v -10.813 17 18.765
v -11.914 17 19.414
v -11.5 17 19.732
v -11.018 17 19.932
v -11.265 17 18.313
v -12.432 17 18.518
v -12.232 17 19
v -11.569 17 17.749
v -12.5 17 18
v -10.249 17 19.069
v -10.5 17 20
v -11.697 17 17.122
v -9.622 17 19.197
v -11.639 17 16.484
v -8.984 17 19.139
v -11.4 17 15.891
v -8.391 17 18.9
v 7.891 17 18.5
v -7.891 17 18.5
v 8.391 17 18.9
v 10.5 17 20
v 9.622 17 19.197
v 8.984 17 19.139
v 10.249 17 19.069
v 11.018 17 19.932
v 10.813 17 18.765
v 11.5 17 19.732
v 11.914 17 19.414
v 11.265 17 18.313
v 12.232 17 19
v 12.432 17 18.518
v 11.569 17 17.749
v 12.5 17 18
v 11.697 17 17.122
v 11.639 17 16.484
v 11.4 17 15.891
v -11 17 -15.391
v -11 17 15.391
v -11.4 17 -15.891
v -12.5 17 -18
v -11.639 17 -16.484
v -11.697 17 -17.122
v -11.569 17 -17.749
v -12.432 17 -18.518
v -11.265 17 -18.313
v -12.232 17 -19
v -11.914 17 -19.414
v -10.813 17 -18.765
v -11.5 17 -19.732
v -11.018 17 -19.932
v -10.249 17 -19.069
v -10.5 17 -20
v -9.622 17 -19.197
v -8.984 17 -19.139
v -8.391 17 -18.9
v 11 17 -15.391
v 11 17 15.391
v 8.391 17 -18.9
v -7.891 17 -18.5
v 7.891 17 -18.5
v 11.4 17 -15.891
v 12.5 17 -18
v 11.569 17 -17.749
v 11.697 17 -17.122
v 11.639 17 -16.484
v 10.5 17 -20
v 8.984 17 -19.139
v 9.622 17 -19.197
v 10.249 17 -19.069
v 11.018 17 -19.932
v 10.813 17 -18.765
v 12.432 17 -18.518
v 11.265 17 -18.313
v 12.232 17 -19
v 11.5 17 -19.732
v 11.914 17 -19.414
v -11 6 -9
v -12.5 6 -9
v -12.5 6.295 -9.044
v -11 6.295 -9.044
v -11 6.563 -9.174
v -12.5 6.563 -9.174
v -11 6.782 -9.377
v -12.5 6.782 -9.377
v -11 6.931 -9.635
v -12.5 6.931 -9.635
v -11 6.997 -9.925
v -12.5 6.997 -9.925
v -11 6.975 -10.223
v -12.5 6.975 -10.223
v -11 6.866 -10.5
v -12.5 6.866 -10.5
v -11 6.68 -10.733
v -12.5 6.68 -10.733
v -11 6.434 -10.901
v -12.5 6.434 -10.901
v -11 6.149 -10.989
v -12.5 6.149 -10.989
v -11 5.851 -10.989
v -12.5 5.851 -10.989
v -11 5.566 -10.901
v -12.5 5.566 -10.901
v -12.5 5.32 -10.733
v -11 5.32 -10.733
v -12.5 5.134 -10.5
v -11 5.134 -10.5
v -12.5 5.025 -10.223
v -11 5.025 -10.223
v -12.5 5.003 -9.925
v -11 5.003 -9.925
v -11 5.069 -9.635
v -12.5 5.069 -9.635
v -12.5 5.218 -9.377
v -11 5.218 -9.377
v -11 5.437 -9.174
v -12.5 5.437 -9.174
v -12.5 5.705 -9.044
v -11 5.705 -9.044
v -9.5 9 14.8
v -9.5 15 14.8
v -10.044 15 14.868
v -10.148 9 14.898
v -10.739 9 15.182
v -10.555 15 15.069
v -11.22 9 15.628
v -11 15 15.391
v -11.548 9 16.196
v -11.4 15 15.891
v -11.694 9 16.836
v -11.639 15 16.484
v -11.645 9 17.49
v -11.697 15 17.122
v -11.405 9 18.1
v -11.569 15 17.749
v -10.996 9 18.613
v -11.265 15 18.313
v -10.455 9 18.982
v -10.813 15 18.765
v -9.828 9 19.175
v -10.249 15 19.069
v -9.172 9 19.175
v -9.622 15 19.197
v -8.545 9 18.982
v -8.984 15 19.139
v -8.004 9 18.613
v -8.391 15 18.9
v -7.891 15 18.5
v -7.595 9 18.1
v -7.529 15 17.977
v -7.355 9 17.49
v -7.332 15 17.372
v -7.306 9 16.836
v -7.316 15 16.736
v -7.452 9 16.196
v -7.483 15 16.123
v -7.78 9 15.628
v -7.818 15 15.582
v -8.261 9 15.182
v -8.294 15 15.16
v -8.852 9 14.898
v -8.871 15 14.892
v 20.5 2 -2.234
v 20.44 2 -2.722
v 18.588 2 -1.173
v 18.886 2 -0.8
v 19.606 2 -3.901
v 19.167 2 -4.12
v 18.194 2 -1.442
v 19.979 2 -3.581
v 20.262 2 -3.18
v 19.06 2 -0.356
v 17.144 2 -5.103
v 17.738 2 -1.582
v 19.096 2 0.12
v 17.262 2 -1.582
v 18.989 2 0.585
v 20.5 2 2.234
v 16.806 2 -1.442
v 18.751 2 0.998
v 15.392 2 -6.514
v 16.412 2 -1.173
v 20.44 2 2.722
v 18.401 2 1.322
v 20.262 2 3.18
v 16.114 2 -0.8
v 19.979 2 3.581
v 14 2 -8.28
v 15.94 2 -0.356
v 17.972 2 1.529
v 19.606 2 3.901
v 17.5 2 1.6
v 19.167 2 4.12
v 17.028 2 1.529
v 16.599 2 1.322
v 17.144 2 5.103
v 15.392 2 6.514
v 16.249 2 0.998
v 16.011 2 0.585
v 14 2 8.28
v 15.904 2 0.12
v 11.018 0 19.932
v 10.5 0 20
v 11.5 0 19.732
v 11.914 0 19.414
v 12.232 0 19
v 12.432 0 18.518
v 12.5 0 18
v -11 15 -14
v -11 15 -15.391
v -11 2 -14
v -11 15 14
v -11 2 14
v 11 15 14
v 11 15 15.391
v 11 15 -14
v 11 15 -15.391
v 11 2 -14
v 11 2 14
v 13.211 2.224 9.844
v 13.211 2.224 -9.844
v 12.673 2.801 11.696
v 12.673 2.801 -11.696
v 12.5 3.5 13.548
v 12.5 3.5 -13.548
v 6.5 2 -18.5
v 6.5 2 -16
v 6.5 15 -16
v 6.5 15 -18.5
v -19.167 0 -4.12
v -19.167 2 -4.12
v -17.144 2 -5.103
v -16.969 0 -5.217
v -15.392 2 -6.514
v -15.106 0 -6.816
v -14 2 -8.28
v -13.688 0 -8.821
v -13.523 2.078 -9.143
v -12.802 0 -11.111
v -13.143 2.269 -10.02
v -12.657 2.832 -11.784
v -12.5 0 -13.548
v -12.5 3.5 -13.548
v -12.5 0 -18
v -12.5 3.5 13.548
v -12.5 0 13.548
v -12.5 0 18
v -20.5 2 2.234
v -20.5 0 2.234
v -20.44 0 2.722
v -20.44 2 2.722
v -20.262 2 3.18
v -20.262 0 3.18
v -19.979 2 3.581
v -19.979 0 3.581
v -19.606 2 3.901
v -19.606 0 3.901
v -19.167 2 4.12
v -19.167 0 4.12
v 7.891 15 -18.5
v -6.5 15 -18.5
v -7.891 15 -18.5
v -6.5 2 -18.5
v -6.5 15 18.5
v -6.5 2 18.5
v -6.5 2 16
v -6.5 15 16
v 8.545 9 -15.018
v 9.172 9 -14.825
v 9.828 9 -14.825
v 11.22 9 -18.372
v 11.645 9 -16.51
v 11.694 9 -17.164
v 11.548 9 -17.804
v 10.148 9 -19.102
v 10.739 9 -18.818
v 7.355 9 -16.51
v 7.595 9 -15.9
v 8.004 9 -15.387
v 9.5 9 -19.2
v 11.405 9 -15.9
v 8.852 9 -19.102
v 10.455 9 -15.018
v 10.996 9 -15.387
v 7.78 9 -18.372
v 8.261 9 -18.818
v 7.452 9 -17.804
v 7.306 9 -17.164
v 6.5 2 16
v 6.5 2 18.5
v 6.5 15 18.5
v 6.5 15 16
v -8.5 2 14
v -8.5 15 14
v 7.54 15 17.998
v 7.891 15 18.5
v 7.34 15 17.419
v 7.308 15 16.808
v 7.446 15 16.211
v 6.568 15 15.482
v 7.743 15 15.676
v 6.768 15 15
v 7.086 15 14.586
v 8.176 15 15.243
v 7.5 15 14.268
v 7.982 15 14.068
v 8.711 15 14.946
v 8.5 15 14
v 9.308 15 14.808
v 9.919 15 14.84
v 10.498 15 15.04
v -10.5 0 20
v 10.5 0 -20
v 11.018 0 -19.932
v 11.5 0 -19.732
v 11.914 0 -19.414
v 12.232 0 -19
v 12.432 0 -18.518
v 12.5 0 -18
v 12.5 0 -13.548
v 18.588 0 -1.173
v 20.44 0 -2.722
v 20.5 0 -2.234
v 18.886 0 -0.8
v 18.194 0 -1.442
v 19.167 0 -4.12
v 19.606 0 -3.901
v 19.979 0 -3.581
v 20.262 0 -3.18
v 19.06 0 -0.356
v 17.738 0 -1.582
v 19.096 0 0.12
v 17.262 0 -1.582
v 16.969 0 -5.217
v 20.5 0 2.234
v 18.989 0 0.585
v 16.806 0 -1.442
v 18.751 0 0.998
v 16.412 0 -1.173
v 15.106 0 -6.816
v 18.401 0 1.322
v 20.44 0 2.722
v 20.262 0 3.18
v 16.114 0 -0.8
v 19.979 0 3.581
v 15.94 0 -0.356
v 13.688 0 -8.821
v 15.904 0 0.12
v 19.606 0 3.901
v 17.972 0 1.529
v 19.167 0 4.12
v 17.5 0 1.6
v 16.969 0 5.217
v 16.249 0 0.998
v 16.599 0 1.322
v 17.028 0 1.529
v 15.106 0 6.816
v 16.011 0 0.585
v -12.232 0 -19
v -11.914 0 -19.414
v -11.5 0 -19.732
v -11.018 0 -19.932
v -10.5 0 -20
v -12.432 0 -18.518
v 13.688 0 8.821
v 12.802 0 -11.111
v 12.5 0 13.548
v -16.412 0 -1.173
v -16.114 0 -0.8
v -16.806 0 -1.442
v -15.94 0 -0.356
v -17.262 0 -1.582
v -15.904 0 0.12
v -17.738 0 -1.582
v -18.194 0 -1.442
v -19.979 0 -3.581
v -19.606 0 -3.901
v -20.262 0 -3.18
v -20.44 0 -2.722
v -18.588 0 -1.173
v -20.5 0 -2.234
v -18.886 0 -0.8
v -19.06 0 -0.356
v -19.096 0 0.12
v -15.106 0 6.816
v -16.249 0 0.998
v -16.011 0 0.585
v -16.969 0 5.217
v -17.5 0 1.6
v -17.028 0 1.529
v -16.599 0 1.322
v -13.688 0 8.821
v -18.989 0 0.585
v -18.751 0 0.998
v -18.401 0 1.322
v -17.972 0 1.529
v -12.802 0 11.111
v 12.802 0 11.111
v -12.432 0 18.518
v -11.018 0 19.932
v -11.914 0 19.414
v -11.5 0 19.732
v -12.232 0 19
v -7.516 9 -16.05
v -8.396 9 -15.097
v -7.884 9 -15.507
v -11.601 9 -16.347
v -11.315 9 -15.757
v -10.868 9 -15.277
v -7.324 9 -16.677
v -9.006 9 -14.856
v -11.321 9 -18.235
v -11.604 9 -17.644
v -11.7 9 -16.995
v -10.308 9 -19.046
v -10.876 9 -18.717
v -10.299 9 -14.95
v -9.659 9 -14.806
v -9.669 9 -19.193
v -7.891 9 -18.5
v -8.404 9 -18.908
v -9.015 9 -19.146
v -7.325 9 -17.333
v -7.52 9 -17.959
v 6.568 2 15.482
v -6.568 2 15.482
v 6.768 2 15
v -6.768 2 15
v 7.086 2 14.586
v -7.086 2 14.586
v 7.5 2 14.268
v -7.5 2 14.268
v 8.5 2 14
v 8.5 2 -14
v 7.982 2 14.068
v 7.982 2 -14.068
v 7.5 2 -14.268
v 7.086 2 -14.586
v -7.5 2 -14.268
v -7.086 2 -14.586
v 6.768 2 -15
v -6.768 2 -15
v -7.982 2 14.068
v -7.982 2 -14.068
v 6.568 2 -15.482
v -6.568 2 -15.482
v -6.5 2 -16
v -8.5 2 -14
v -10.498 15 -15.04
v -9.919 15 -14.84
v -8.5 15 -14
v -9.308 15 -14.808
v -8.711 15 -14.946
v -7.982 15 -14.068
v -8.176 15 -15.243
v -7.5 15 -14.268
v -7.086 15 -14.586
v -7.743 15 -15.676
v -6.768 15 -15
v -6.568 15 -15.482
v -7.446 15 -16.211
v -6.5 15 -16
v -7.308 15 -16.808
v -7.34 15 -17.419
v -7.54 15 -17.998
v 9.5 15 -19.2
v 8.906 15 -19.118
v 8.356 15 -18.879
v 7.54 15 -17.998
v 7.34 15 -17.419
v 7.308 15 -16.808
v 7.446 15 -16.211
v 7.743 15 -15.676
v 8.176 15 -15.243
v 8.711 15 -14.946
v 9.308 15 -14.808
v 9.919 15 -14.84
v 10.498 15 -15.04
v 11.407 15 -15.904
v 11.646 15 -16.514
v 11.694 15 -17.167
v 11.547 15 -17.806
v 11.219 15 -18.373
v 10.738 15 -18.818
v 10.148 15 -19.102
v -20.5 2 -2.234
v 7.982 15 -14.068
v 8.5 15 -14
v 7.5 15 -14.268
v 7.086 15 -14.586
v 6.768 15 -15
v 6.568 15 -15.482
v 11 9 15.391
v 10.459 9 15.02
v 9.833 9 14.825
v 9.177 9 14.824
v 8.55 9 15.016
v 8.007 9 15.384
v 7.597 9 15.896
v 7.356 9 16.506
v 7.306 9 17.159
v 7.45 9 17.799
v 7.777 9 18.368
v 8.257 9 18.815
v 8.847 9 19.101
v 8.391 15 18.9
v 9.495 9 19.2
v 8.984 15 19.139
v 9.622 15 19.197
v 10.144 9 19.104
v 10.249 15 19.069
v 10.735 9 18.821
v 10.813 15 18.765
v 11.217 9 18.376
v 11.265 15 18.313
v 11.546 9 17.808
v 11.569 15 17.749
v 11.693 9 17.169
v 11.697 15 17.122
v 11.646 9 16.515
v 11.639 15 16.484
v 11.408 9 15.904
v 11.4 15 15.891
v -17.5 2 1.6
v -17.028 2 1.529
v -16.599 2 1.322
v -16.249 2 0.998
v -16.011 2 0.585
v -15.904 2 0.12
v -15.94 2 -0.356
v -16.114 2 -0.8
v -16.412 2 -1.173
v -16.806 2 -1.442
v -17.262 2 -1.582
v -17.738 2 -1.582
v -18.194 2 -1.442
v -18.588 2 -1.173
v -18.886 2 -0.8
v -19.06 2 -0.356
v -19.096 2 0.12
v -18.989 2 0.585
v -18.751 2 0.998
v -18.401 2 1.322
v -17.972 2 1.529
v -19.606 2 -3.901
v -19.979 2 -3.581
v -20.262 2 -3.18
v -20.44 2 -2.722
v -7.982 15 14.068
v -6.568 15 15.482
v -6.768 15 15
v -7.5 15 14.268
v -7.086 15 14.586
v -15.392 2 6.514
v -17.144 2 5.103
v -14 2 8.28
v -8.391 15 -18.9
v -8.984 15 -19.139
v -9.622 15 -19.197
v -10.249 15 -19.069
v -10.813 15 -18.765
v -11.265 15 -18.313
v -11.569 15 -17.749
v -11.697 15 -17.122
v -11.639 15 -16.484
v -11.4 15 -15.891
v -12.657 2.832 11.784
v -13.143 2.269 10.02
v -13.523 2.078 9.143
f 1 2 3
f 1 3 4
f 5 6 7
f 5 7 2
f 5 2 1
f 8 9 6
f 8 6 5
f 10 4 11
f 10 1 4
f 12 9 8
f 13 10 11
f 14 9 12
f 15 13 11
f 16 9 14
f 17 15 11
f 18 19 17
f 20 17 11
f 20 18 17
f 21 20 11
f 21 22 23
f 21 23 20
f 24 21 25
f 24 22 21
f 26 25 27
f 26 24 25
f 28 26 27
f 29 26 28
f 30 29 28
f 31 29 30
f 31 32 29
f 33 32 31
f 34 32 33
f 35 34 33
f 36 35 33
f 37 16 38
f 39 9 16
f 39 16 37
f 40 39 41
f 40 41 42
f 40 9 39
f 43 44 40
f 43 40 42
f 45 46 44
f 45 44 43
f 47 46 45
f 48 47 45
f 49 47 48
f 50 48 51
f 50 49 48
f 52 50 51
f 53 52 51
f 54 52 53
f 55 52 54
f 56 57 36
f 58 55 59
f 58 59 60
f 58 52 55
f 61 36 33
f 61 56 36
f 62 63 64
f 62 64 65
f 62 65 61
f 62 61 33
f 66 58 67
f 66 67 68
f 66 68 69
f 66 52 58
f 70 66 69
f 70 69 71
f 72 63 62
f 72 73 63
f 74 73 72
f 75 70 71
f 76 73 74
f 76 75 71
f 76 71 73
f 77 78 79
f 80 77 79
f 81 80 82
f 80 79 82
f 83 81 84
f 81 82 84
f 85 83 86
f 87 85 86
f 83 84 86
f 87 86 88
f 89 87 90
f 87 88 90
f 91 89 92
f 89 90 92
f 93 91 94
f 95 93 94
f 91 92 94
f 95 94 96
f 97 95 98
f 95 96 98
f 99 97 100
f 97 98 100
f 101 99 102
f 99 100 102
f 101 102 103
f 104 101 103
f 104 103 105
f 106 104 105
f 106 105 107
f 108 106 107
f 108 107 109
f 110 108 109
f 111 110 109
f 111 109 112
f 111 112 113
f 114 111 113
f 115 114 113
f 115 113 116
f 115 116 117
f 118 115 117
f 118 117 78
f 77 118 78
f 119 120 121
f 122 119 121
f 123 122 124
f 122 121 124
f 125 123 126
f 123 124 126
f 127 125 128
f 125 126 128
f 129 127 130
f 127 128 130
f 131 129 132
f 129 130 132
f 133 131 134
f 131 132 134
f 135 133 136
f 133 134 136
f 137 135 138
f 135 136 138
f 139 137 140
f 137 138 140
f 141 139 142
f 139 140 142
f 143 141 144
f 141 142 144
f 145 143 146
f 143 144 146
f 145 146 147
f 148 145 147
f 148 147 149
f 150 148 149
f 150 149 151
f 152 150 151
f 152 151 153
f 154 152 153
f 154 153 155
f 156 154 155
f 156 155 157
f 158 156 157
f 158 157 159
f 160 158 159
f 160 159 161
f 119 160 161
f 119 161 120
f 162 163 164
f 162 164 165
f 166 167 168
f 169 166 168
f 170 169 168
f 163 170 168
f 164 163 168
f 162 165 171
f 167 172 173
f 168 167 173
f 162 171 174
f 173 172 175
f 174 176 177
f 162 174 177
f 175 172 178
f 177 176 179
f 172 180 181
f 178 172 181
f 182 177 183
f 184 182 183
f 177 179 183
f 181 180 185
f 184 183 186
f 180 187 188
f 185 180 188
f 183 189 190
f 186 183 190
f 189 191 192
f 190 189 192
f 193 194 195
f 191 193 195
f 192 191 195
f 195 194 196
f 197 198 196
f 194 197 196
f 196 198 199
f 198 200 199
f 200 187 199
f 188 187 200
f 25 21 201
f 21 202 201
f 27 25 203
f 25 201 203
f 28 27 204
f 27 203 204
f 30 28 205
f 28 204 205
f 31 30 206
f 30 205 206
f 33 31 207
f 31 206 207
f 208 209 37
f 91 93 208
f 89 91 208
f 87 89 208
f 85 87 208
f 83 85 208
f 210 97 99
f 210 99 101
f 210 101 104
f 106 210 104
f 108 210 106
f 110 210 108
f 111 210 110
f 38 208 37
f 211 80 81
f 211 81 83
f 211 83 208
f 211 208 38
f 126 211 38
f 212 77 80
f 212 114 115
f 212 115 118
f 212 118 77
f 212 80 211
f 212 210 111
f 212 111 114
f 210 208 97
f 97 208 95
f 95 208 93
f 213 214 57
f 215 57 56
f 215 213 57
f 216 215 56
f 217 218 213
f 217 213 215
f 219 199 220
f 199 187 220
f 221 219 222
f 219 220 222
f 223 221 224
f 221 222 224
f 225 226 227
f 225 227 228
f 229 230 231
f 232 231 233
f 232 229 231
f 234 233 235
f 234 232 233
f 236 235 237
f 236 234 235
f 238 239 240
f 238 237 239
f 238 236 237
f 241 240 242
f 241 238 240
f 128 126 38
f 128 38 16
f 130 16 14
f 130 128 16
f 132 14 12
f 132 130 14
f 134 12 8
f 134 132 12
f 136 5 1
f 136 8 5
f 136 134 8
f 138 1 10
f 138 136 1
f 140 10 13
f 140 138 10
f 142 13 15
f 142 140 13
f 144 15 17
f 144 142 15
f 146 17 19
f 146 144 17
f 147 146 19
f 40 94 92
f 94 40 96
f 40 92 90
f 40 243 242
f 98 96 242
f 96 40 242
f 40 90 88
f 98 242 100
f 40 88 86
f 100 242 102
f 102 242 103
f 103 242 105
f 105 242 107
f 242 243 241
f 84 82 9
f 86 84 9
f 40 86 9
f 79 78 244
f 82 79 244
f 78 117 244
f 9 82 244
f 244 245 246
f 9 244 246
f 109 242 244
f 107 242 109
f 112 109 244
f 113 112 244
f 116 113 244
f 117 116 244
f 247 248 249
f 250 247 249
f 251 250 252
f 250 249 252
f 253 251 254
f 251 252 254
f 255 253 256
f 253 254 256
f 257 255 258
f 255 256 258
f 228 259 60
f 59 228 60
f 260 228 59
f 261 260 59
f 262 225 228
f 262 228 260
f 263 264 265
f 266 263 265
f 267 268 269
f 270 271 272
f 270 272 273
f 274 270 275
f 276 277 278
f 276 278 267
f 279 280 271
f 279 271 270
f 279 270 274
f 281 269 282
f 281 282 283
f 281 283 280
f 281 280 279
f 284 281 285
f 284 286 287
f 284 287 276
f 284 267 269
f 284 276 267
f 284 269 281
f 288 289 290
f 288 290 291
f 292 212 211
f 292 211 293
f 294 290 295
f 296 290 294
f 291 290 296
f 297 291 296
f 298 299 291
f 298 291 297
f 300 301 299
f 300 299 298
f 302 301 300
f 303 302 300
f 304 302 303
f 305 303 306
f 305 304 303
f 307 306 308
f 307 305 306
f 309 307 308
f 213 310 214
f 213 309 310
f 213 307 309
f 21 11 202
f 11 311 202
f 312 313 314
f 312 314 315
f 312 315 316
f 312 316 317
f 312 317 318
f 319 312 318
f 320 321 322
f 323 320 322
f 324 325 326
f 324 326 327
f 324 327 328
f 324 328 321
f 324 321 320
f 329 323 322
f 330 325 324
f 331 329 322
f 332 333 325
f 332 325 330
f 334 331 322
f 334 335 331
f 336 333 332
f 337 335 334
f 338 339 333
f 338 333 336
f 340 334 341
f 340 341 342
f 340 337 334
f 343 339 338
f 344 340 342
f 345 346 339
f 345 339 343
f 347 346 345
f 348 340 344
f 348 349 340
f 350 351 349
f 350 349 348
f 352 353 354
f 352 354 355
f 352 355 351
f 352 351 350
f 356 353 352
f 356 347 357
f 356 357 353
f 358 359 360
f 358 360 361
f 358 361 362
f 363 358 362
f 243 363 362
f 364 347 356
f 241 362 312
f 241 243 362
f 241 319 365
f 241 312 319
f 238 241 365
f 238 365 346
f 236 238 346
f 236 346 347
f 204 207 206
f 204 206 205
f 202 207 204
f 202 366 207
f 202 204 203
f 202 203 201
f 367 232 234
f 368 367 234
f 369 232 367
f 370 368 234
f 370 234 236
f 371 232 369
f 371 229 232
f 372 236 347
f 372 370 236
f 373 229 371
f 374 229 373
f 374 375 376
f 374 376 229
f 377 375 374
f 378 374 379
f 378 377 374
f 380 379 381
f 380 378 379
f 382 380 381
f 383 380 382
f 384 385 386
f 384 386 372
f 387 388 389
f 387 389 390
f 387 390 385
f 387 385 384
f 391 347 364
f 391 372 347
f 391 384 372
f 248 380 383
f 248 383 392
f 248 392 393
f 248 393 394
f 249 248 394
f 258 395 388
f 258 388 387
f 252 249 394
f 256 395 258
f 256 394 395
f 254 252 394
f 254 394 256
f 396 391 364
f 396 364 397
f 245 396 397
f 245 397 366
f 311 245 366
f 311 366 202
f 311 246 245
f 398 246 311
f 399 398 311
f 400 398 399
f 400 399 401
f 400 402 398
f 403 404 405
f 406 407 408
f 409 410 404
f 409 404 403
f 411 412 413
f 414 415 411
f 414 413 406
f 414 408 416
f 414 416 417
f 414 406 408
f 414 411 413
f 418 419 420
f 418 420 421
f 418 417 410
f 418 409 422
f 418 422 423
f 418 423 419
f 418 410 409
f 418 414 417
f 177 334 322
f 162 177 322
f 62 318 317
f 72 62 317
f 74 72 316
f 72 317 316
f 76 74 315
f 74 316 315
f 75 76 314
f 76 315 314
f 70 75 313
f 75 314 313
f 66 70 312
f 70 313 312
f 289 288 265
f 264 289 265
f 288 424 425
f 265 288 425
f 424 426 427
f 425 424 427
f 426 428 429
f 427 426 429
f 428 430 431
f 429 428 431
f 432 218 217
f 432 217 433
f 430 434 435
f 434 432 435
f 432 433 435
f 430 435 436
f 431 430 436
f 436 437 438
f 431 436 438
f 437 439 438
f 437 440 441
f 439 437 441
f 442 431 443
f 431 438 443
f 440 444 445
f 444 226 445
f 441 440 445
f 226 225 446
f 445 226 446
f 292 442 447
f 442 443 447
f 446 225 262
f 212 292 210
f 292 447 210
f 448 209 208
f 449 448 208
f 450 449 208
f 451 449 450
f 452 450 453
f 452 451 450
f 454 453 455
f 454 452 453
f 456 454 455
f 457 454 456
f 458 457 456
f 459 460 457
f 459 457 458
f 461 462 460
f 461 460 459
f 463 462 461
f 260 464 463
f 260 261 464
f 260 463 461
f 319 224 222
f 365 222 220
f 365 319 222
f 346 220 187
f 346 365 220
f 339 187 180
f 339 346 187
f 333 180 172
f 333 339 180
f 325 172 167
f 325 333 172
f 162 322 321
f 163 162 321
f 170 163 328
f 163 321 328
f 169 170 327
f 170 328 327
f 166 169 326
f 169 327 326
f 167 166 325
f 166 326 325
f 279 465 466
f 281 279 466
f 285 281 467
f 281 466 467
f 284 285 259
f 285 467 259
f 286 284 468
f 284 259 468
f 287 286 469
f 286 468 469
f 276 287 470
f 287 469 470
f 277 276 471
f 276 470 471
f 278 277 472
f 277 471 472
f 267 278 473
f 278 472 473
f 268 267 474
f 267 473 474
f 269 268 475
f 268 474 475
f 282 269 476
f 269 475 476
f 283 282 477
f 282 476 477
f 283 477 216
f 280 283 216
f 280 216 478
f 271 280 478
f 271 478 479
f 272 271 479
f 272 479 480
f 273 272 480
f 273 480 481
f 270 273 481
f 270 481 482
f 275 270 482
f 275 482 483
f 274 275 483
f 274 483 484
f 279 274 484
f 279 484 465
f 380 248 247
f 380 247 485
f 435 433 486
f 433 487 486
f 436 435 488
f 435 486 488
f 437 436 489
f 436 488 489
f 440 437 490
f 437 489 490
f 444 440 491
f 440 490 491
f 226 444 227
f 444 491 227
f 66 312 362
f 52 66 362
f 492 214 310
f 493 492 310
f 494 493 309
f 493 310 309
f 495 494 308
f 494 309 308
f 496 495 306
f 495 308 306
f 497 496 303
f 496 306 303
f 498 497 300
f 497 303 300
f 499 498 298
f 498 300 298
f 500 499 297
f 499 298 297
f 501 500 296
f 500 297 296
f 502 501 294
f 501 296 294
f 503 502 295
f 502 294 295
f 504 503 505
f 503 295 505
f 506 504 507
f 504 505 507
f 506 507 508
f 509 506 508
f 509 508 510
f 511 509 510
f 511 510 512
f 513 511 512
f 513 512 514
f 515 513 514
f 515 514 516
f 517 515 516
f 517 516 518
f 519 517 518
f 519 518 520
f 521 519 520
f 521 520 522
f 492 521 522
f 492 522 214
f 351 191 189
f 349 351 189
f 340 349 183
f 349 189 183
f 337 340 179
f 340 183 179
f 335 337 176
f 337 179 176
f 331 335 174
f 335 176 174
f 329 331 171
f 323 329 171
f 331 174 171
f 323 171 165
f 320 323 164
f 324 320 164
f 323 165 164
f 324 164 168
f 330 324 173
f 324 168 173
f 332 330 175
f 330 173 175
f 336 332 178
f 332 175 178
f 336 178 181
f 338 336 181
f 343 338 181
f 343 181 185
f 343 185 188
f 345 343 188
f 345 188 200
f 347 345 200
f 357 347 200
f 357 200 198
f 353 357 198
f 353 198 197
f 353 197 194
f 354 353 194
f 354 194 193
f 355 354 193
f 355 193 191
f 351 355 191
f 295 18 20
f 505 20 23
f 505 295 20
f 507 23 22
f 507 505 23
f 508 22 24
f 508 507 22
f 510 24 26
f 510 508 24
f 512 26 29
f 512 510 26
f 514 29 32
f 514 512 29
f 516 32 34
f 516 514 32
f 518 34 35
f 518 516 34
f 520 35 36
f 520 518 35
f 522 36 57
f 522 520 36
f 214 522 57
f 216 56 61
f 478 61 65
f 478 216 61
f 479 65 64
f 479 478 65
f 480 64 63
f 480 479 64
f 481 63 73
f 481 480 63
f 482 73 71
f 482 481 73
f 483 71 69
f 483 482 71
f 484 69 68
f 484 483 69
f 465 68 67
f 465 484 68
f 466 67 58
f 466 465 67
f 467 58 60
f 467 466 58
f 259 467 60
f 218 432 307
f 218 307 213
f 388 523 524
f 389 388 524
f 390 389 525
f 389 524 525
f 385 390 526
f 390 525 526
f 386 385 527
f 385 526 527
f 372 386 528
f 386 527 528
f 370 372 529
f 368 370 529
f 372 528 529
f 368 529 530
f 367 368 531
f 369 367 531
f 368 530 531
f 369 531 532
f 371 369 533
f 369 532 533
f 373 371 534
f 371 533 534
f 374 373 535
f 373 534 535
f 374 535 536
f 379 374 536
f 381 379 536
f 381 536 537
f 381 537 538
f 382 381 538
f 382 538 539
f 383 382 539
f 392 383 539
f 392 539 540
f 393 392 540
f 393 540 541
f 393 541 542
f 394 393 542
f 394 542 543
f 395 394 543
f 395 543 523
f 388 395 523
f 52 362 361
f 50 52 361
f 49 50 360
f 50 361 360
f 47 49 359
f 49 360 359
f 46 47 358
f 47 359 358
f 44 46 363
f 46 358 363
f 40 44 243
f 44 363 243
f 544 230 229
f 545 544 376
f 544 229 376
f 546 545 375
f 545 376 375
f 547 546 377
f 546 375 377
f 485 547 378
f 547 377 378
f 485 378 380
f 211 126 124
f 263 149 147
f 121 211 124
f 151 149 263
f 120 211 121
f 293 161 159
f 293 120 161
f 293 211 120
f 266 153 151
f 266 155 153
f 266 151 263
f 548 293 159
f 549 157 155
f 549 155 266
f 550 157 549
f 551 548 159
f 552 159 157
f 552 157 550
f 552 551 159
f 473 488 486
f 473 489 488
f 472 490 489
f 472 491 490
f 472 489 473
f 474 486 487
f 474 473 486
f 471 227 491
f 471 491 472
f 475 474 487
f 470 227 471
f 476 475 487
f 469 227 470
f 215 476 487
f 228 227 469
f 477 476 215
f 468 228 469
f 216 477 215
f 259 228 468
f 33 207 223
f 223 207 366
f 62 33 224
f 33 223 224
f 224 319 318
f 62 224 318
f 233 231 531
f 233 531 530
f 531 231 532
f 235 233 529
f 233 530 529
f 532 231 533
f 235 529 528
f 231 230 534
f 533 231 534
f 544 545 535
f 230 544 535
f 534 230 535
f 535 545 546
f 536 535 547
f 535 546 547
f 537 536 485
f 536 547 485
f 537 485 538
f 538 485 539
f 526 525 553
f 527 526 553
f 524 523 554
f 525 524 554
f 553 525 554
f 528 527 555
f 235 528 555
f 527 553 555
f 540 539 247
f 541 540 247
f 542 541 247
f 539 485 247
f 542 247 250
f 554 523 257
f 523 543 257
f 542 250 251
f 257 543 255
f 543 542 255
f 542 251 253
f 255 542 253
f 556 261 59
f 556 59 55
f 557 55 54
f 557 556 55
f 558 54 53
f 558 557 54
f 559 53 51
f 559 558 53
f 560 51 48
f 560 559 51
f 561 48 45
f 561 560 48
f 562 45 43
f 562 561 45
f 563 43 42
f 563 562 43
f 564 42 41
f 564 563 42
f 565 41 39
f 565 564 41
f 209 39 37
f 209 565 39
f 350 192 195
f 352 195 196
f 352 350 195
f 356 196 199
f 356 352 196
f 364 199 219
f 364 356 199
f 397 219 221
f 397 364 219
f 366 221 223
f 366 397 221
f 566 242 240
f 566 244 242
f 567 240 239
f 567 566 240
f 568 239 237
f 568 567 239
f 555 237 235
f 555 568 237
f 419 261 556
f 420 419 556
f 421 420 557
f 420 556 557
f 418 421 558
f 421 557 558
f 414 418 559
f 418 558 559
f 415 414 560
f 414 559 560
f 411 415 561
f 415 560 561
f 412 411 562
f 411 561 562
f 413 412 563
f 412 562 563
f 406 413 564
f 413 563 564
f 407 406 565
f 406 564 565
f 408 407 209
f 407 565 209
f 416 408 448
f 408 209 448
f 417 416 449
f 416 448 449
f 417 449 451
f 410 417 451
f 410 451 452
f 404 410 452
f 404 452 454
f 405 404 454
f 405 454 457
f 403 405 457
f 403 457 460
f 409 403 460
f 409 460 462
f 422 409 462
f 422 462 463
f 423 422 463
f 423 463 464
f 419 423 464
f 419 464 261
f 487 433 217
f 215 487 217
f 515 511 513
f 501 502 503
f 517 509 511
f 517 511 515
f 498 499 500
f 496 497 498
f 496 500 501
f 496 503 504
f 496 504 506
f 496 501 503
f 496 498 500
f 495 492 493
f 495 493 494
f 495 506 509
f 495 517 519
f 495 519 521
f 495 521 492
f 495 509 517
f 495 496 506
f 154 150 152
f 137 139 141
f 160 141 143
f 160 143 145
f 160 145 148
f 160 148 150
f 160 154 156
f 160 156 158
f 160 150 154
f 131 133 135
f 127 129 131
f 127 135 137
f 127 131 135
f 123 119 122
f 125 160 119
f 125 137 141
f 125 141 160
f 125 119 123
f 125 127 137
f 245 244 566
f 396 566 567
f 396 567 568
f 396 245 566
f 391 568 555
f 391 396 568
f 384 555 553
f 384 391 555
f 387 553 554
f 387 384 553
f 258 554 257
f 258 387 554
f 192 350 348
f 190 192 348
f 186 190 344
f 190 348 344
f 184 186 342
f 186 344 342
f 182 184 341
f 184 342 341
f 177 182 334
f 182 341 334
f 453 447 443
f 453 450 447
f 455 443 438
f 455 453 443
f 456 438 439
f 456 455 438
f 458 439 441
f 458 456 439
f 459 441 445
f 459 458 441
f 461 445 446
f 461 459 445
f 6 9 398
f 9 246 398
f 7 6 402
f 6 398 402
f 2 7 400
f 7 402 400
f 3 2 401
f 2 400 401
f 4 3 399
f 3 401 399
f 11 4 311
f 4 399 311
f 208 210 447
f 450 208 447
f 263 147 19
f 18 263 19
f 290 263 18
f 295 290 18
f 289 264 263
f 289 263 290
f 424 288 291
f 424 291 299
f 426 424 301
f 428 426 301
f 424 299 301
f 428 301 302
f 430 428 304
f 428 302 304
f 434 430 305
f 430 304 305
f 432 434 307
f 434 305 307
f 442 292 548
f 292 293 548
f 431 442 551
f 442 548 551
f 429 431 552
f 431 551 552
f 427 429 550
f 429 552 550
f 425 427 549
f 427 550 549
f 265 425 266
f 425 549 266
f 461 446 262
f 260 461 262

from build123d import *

# Parameters (mm, degrees)
BASE_DEPTH                  = 2
MUR_DEPTH                   = 15
ESQUISSE3_W                 = 4.5
ESQUISSE3_H                 = 4.5
FIXATION_VIS_DEPTH          = 13
CONG_1_R                    = 2
ESQUISSE4_R                 = 2.2
INSERT_M3_DEPTH             = 6
INSERT_M3_DIRECTION_2_REACH = 29.951
PASSE_CABLE_REACH           = 38.249
ESQUISSE5_R                 = 1
ESQUISSE8_W                 = 8
ESQUISSE8_H                 = 7.5
PATES_FIXATION_DEPTH        = 2
PASSAGE_VIS_REACH           = 34.33
ESQUISSE9_R                 = 1.6
CONG_10MM_R                 = 10
CONG_2MM_R                  = 2
CONG_1_5MM_R                = 1.5


with BuildPart() as part:
    # Esquisse1 → Base (new body)
    with BuildSketch(Plane(origin=(0, 0, 0), x_dir=(1, 0, 0), z_dir=(0, 1, 0))):
        with BuildLine():
            Line((-10.5, 20), (10.5, 20))
            ThreePointArc((10.5, 20), (11.914213562, 19.414213562), (12.5, 18))
            Line((12.5, 18), (12.5, -18))
            ThreePointArc((12.5, -18), (11.914213562, -19.414213562), (10.5, -20))
            Line((10.5, -20), (-10.5, -20))
            ThreePointArc((-10.5, -20), (-11.914213562, -19.414213562), (-12.5, -18))
            Line((-12.5, -18), (-12.5, 18))
            ThreePointArc((-12.5, 18), (-11.914213562, 19.414213562), (-10.5, 20))
        make_face()
    extrude(amount=BASE_DEPTH)

    # Esquisse2 → Mur (add)
    with BuildSketch(Plane(origin=(0, 2, 0), x_dir=(1, 0, 0), z_dir=(0, 1, 0))):
        with BuildLine():
            Line((-12.5, 18), (-12.5, -18))
            ThreePointArc((-12.5, -18), (-11.914213562, -19.414213562), (-10.5, -20))
            Line((-10.5, -20), (10.5, -20))
            ThreePointArc((10.5, -20), (11.914213562, -19.414213562), (12.5, -18))
            Line((12.5, -18), (12.5, 18))
            ThreePointArc((12.5, 18), (11.914213562, 19.414213562), (10.5, 20))
            Line((10.5, 20), (-10.5, 20))
            ThreePointArc((-10.5, 20), (-11.914213562, 19.414213562), (-12.5, 18))
        make_face()
        with BuildLine():
            ThreePointArc((-10.5, 18.5), (-10.853553391, 18.353553391), (-11, 18))
            Line((-11, 18), (-11, -18))
            ThreePointArc((-11, -18), (-10.853553391, -18.353553391), (-10.5, -18.5))
            Line((-10.5, -18.5), (10.5, -18.5))
            ThreePointArc((10.5, -18.5), (10.853553391, -18.353553391), (11, -18))
            Line((11, -18), (11, 18))
            ThreePointArc((11, 18), (10.853553391, 18.353553391), (10.5, 18.5))
            Line((10.5, 18.5), (-10.5, 18.5))
        make_face(mode=Mode.SUBTRACT)
    extrude(amount=MUR_DEPTH)

    # Esquisse3 → Fixation Vis (add)
    with BuildSketch(Plane(origin=(0, 2, 0), x_dir=(1, 0, 0), z_dir=(0, 1, 0))):
        with Locations((-8.75, 16.25)):
            Rectangle(ESQUISSE3_W, ESQUISSE3_H)
        with Locations((8.75, 16.25)):
            Rectangle(ESQUISSE3_W, ESQUISSE3_H)
        with Locations((8.75, -16.25)):
            Rectangle(ESQUISSE3_W, ESQUISSE3_H)
        with Locations((-8.75, -16.25)):
            Rectangle(ESQUISSE3_W, ESQUISSE3_H)
    extrude(amount=FIXATION_VIS_DEPTH)

    # Congé1
    cong_1_edges = [part.edges().sort_by_distance(p)[0] for p in [
        (6.5, 8.5, 14),
        (-6.5, 8.5, 14),
        (-6.5, 8.5, -14),
        (6.5, 8.5, -14),
    ]]
    fillet(cong_1_edges, radius=CONG_1_R)

    # Esquisse4 → Insert M3 (cut)
    with BuildSketch(Plane(origin=(0, 15, 0), x_dir=(1, 0, 0), z_dir=(0, 1, 0))):
        with Locations(Location((-9.5, 17, 0), (0, 0, 42.98588608))):
            Circle(ESQUISSE4_R)
        with Locations(Location((9.5, 17, 0), (0, 0, 90))):
            Circle(ESQUISSE4_R)
        with Locations(Location((9.5, -17, 0), (0, 0, 47.01411392))):
            Circle(ESQUISSE4_R)
        with Locations(Location((-9.5, -17, 0), (0, 0, 90))):
            Circle(ESQUISSE4_R)
    extrude(amount=-INSERT_M3_DEPTH, mode=Mode.SUBTRACT)

    # Esquisse4 → Insert M3 direction 2 (cut, up to next)
    with BuildSketch(Plane(origin=(0, 15, 0), x_dir=(1, 0, 0), z_dir=(0, 1, 0)), mode=Mode.PRIVATE) as insert_m3_direction_2_sk1:
        with Locations(Location((-9.5, 17, 0), (0, 0, 42.98588608))):
            Circle(ESQUISSE4_R)
    insert_m3_direction_2_tool1 = extrude(insert_m3_direction_2_sk1.sketch, amount=INSERT_M3_DIRECTION_2_REACH, mode=Mode.PRIVATE) & part.part
    # Esquisse4 → Insert M3 direction 2 (cut, up to next)
    with BuildSketch(Plane(origin=(0, 15, 0), x_dir=(1, 0, 0), z_dir=(0, 1, 0)), mode=Mode.PRIVATE) as insert_m3_direction_2_sk2:
        with Locations(Location((9.5, 17, 0), (0, 0, 90))):
            Circle(ESQUISSE4_R)
    insert_m3_direction_2_tool2 = extrude(insert_m3_direction_2_sk2.sketch, amount=INSERT_M3_DIRECTION_2_REACH, mode=Mode.PRIVATE) & part.part
    # Esquisse4 → Insert M3 direction 2 (cut, up to next)
    with BuildSketch(Plane(origin=(0, 15, 0), x_dir=(1, 0, 0), z_dir=(0, 1, 0)), mode=Mode.PRIVATE) as insert_m3_direction_2_sk3:
        with Locations(Location((9.5, -17, 0), (0, 0, 47.01411392))):
            Circle(ESQUISSE4_R)
    insert_m3_direction_2_tool3 = extrude(insert_m3_direction_2_sk3.sketch, amount=INSERT_M3_DIRECTION_2_REACH, mode=Mode.PRIVATE) & part.part
    # Esquisse4 → Insert M3 direction 2 (cut, up to next)
    with BuildSketch(Plane(origin=(0, 15, 0), x_dir=(1, 0, 0), z_dir=(0, 1, 0)), mode=Mode.PRIVATE) as insert_m3_direction_2_sk4:
        with Locations(Location((-9.5, -17, 0), (0, 0, 90))):
            Circle(ESQUISSE4_R)
    insert_m3_direction_2_tool4 = extrude(insert_m3_direction_2_sk4.sketch, amount=INSERT_M3_DIRECTION_2_REACH, mode=Mode.PRIVATE) & part.part
    add(insert_m3_direction_2_tool1.solids().sort_by_distance((-9.5, 15, -17))[0], mode=Mode.SUBTRACT)
    add(insert_m3_direction_2_tool2.solids().sort_by_distance((9.5, 15, -17))[0], mode=Mode.SUBTRACT)
    add(insert_m3_direction_2_tool3.solids().sort_by_distance((9.5, 15, 17))[0], mode=Mode.SUBTRACT)
    add(insert_m3_direction_2_tool4.solids().sort_by_distance((-9.5, 15, 17))[0], mode=Mode.SUBTRACT)

    # Esquisse5 → Passe-Cable (cut, up to next)
    with BuildSketch(Plane.ZY.offset(12.5), mode=Mode.PRIVATE) as passe_cable_sk1:
        with Locations((-10, 6)):
            Circle(ESQUISSE5_R)
    passe_cable_tool1 = extrude(passe_cable_sk1.sketch, amount=-PASSE_CABLE_REACH, mode=Mode.PRIVATE) & part.part
    add(passe_cable_tool1.solids().sort_by_distance((-12.5, 6, -10))[0], mode=Mode.SUBTRACT)

    # Esquisse8 → Pates fixation (add)
    with BuildSketch(Plane(origin=(0, 0, 0), x_dir=(1, 0, 0), z_dir=(0, 1, 0))):
        with Locations((16.5, 0)):
            Rectangle(ESQUISSE8_W, ESQUISSE8_H)
        with Locations((-16.5, 0)):
            Rectangle(ESQUISSE8_W, ESQUISSE8_H)
    extrude(amount=PATES_FIXATION_DEPTH)

    # Esquisse9 → Passage_Vis (cut, up to next)
    with BuildSketch(Plane(origin=(0, 2, 0), x_dir=(1, 0, 0), z_dir=(0, 1, 0)), mode=Mode.PRIVATE) as passage_vis_sk1:
        with Locations(Location((-17.5, 0, 0), (0, 0, 270))):
            Circle(ESQUISSE9_R)
    passage_vis_tool1 = extrude(passage_vis_sk1.sketch, amount=-PASSAGE_VIS_REACH, mode=Mode.PRIVATE) & part.part
    # Esquisse9 → Passage_Vis (cut, up to next)
    with BuildSketch(Plane(origin=(0, 2, 0), x_dir=(1, 0, 0), z_dir=(0, 1, 0)), mode=Mode.PRIVATE) as passage_vis_sk2:
        with Locations(Location((17.5, 0, 0), (0, 0, 270))):
            Circle(ESQUISSE9_R)
    passage_vis_tool2 = extrude(passage_vis_sk2.sketch, amount=-PASSAGE_VIS_REACH, mode=Mode.PRIVATE) & part.part
    add(passage_vis_tool1.solids().sort_by_distance((-17.5, 2, 0))[0], mode=Mode.SUBTRACT)
    add(passage_vis_tool2.solids().sort_by_distance((17.5, 2, 0))[0], mode=Mode.SUBTRACT)

    # Congé_10mm
    # the kernel refuses this fillet: 10 mm, written as the material it adds along each edge
    with BuildSketch(Plane(origin=(12.5, 0, 3.75), x_dir=(0, 0, 1), z_dir=(0, 1, 0)), Plane(origin=(-12.5, 0, -3.75), x_dir=(0, 0, -1), z_dir=(0, 1, 0))) as cong_10mm_piece_1:
        with BuildLine():
            CenterArc((9.797958971, 10), CONG_10MM_R, 191.536959033, 78.463040967)
            Line((0, 8), (-0.195959179, 7.96))
            ThreePointArc((-0.195959179, 7.96), (-0.2, 4), (-0.2, 0))
            Line((-0.2, 0), (0, -0.2))
            Line((0, -0.2), (9.797958971, -0.2))
            Line((9.797958971, -0.2), (9.797958971, 0))
        make_face()
    extrude(amount=2)
    with BuildSketch(Plane(origin=(12.5, 0, -3.75), x_dir=(0, 0, -1), z_dir=(0, 1, 0)), Plane(origin=(-12.5, 0, 3.75), x_dir=(0, 0, 1), z_dir=(0, 1, 0))) as cong_10mm_piece_2:
        with BuildLine():
            CenterArc((9.797958971, -10), CONG_10MM_R, 90, 78.463040967)
            Line((0, -8), (-0.195959179, -7.96))
            ThreePointArc((-0.195959179, -7.96), (-0.2, -4), (-0.2, 0))
            Line((-0.2, 0), (0, 0.2))
            Line((0, 0.2), (9.797958971, 0.2))
            Line((9.797958971, 0.2), (9.797958971, 0))
        make_face()
    extrude(amount=2)

    # Congé_2mm
    # the kernel refuses this fillet: 2 mm, written as the material it takes off along each edge
    with BuildSketch(Plane(origin=(20.5, -3.78937382, 3.75), x_dir=(-0.9636113749942804, 0, 0.26730716036356444), z_dir=(0, 1, 0)), Plane(origin=(-20.5, -3.78937382, -3.75), x_dir=(0.9636113749942804, 0, -0.26730716036356456), z_dir=(0, 1, 0))) as cong_2mm_piece_1:
        with BuildLine():
            CenterArc((1.522052048, -1.995207807), CONG_2MM_R, 93.967130801, 70.528779366)
            Line((-0.405170702, -1.460593487), (0, 0))
            ThreePointArc((0, 0), (0.69184184, -0.023960963), (1.38368368, 0))
        make_face()
    extrude(amount=9.578747639, mode=Mode.SUBTRACT)
    with BuildSketch(Plane(origin=(20.5, -3.78937382, -3.75), x_dir=(-0.9636113749942801, 0, -0.2673071603635657), z_dir=(0, 1, 0))) as cong_2mm_piece_2:
        with BuildLine():
            CenterArc((1.522052048, 1.995207807), CONG_2MM_R, 195.504089834, 70.528779366)
            Line((-0.405170702, 1.460593487), (0, 0))
            ThreePointArc((0, 0), (0.69184184, 0.023960963), (1.38368368, 0))
        make_face()
    extrude(amount=9.578747639, mode=Mode.SUBTRACT)
    with BuildSketch(Plane(origin=(-20.5, -3.78937382, 3.75), x_dir=(0, 0, -1), z_dir=(0, 1, 0))) as cong_2mm_piece_3:
        with BuildLine():
            CenterArc((1.515749528, -2), CONG_2MM_R, 90, 70.528779366)
            ThreePointArc((-0.369868555, -1.333333333), (-0.161845221, -0.673071604), (0, 0))
            Line((0, 0), (1.515749528, 0))
        make_face()
    extrude(amount=9.578747639, mode=Mode.SUBTRACT)

    # Congé_1,5mm
    cong_1_5mm_edges = [part.edges().sort_by_distance(p)[0] for p in [
        (12.5, 2, 0),
        (-12.5, 2, 0),
    ]]
    fillet(cong_1_5mm_edges, radius=CONG_1_5MM_R)


solid = part.part
